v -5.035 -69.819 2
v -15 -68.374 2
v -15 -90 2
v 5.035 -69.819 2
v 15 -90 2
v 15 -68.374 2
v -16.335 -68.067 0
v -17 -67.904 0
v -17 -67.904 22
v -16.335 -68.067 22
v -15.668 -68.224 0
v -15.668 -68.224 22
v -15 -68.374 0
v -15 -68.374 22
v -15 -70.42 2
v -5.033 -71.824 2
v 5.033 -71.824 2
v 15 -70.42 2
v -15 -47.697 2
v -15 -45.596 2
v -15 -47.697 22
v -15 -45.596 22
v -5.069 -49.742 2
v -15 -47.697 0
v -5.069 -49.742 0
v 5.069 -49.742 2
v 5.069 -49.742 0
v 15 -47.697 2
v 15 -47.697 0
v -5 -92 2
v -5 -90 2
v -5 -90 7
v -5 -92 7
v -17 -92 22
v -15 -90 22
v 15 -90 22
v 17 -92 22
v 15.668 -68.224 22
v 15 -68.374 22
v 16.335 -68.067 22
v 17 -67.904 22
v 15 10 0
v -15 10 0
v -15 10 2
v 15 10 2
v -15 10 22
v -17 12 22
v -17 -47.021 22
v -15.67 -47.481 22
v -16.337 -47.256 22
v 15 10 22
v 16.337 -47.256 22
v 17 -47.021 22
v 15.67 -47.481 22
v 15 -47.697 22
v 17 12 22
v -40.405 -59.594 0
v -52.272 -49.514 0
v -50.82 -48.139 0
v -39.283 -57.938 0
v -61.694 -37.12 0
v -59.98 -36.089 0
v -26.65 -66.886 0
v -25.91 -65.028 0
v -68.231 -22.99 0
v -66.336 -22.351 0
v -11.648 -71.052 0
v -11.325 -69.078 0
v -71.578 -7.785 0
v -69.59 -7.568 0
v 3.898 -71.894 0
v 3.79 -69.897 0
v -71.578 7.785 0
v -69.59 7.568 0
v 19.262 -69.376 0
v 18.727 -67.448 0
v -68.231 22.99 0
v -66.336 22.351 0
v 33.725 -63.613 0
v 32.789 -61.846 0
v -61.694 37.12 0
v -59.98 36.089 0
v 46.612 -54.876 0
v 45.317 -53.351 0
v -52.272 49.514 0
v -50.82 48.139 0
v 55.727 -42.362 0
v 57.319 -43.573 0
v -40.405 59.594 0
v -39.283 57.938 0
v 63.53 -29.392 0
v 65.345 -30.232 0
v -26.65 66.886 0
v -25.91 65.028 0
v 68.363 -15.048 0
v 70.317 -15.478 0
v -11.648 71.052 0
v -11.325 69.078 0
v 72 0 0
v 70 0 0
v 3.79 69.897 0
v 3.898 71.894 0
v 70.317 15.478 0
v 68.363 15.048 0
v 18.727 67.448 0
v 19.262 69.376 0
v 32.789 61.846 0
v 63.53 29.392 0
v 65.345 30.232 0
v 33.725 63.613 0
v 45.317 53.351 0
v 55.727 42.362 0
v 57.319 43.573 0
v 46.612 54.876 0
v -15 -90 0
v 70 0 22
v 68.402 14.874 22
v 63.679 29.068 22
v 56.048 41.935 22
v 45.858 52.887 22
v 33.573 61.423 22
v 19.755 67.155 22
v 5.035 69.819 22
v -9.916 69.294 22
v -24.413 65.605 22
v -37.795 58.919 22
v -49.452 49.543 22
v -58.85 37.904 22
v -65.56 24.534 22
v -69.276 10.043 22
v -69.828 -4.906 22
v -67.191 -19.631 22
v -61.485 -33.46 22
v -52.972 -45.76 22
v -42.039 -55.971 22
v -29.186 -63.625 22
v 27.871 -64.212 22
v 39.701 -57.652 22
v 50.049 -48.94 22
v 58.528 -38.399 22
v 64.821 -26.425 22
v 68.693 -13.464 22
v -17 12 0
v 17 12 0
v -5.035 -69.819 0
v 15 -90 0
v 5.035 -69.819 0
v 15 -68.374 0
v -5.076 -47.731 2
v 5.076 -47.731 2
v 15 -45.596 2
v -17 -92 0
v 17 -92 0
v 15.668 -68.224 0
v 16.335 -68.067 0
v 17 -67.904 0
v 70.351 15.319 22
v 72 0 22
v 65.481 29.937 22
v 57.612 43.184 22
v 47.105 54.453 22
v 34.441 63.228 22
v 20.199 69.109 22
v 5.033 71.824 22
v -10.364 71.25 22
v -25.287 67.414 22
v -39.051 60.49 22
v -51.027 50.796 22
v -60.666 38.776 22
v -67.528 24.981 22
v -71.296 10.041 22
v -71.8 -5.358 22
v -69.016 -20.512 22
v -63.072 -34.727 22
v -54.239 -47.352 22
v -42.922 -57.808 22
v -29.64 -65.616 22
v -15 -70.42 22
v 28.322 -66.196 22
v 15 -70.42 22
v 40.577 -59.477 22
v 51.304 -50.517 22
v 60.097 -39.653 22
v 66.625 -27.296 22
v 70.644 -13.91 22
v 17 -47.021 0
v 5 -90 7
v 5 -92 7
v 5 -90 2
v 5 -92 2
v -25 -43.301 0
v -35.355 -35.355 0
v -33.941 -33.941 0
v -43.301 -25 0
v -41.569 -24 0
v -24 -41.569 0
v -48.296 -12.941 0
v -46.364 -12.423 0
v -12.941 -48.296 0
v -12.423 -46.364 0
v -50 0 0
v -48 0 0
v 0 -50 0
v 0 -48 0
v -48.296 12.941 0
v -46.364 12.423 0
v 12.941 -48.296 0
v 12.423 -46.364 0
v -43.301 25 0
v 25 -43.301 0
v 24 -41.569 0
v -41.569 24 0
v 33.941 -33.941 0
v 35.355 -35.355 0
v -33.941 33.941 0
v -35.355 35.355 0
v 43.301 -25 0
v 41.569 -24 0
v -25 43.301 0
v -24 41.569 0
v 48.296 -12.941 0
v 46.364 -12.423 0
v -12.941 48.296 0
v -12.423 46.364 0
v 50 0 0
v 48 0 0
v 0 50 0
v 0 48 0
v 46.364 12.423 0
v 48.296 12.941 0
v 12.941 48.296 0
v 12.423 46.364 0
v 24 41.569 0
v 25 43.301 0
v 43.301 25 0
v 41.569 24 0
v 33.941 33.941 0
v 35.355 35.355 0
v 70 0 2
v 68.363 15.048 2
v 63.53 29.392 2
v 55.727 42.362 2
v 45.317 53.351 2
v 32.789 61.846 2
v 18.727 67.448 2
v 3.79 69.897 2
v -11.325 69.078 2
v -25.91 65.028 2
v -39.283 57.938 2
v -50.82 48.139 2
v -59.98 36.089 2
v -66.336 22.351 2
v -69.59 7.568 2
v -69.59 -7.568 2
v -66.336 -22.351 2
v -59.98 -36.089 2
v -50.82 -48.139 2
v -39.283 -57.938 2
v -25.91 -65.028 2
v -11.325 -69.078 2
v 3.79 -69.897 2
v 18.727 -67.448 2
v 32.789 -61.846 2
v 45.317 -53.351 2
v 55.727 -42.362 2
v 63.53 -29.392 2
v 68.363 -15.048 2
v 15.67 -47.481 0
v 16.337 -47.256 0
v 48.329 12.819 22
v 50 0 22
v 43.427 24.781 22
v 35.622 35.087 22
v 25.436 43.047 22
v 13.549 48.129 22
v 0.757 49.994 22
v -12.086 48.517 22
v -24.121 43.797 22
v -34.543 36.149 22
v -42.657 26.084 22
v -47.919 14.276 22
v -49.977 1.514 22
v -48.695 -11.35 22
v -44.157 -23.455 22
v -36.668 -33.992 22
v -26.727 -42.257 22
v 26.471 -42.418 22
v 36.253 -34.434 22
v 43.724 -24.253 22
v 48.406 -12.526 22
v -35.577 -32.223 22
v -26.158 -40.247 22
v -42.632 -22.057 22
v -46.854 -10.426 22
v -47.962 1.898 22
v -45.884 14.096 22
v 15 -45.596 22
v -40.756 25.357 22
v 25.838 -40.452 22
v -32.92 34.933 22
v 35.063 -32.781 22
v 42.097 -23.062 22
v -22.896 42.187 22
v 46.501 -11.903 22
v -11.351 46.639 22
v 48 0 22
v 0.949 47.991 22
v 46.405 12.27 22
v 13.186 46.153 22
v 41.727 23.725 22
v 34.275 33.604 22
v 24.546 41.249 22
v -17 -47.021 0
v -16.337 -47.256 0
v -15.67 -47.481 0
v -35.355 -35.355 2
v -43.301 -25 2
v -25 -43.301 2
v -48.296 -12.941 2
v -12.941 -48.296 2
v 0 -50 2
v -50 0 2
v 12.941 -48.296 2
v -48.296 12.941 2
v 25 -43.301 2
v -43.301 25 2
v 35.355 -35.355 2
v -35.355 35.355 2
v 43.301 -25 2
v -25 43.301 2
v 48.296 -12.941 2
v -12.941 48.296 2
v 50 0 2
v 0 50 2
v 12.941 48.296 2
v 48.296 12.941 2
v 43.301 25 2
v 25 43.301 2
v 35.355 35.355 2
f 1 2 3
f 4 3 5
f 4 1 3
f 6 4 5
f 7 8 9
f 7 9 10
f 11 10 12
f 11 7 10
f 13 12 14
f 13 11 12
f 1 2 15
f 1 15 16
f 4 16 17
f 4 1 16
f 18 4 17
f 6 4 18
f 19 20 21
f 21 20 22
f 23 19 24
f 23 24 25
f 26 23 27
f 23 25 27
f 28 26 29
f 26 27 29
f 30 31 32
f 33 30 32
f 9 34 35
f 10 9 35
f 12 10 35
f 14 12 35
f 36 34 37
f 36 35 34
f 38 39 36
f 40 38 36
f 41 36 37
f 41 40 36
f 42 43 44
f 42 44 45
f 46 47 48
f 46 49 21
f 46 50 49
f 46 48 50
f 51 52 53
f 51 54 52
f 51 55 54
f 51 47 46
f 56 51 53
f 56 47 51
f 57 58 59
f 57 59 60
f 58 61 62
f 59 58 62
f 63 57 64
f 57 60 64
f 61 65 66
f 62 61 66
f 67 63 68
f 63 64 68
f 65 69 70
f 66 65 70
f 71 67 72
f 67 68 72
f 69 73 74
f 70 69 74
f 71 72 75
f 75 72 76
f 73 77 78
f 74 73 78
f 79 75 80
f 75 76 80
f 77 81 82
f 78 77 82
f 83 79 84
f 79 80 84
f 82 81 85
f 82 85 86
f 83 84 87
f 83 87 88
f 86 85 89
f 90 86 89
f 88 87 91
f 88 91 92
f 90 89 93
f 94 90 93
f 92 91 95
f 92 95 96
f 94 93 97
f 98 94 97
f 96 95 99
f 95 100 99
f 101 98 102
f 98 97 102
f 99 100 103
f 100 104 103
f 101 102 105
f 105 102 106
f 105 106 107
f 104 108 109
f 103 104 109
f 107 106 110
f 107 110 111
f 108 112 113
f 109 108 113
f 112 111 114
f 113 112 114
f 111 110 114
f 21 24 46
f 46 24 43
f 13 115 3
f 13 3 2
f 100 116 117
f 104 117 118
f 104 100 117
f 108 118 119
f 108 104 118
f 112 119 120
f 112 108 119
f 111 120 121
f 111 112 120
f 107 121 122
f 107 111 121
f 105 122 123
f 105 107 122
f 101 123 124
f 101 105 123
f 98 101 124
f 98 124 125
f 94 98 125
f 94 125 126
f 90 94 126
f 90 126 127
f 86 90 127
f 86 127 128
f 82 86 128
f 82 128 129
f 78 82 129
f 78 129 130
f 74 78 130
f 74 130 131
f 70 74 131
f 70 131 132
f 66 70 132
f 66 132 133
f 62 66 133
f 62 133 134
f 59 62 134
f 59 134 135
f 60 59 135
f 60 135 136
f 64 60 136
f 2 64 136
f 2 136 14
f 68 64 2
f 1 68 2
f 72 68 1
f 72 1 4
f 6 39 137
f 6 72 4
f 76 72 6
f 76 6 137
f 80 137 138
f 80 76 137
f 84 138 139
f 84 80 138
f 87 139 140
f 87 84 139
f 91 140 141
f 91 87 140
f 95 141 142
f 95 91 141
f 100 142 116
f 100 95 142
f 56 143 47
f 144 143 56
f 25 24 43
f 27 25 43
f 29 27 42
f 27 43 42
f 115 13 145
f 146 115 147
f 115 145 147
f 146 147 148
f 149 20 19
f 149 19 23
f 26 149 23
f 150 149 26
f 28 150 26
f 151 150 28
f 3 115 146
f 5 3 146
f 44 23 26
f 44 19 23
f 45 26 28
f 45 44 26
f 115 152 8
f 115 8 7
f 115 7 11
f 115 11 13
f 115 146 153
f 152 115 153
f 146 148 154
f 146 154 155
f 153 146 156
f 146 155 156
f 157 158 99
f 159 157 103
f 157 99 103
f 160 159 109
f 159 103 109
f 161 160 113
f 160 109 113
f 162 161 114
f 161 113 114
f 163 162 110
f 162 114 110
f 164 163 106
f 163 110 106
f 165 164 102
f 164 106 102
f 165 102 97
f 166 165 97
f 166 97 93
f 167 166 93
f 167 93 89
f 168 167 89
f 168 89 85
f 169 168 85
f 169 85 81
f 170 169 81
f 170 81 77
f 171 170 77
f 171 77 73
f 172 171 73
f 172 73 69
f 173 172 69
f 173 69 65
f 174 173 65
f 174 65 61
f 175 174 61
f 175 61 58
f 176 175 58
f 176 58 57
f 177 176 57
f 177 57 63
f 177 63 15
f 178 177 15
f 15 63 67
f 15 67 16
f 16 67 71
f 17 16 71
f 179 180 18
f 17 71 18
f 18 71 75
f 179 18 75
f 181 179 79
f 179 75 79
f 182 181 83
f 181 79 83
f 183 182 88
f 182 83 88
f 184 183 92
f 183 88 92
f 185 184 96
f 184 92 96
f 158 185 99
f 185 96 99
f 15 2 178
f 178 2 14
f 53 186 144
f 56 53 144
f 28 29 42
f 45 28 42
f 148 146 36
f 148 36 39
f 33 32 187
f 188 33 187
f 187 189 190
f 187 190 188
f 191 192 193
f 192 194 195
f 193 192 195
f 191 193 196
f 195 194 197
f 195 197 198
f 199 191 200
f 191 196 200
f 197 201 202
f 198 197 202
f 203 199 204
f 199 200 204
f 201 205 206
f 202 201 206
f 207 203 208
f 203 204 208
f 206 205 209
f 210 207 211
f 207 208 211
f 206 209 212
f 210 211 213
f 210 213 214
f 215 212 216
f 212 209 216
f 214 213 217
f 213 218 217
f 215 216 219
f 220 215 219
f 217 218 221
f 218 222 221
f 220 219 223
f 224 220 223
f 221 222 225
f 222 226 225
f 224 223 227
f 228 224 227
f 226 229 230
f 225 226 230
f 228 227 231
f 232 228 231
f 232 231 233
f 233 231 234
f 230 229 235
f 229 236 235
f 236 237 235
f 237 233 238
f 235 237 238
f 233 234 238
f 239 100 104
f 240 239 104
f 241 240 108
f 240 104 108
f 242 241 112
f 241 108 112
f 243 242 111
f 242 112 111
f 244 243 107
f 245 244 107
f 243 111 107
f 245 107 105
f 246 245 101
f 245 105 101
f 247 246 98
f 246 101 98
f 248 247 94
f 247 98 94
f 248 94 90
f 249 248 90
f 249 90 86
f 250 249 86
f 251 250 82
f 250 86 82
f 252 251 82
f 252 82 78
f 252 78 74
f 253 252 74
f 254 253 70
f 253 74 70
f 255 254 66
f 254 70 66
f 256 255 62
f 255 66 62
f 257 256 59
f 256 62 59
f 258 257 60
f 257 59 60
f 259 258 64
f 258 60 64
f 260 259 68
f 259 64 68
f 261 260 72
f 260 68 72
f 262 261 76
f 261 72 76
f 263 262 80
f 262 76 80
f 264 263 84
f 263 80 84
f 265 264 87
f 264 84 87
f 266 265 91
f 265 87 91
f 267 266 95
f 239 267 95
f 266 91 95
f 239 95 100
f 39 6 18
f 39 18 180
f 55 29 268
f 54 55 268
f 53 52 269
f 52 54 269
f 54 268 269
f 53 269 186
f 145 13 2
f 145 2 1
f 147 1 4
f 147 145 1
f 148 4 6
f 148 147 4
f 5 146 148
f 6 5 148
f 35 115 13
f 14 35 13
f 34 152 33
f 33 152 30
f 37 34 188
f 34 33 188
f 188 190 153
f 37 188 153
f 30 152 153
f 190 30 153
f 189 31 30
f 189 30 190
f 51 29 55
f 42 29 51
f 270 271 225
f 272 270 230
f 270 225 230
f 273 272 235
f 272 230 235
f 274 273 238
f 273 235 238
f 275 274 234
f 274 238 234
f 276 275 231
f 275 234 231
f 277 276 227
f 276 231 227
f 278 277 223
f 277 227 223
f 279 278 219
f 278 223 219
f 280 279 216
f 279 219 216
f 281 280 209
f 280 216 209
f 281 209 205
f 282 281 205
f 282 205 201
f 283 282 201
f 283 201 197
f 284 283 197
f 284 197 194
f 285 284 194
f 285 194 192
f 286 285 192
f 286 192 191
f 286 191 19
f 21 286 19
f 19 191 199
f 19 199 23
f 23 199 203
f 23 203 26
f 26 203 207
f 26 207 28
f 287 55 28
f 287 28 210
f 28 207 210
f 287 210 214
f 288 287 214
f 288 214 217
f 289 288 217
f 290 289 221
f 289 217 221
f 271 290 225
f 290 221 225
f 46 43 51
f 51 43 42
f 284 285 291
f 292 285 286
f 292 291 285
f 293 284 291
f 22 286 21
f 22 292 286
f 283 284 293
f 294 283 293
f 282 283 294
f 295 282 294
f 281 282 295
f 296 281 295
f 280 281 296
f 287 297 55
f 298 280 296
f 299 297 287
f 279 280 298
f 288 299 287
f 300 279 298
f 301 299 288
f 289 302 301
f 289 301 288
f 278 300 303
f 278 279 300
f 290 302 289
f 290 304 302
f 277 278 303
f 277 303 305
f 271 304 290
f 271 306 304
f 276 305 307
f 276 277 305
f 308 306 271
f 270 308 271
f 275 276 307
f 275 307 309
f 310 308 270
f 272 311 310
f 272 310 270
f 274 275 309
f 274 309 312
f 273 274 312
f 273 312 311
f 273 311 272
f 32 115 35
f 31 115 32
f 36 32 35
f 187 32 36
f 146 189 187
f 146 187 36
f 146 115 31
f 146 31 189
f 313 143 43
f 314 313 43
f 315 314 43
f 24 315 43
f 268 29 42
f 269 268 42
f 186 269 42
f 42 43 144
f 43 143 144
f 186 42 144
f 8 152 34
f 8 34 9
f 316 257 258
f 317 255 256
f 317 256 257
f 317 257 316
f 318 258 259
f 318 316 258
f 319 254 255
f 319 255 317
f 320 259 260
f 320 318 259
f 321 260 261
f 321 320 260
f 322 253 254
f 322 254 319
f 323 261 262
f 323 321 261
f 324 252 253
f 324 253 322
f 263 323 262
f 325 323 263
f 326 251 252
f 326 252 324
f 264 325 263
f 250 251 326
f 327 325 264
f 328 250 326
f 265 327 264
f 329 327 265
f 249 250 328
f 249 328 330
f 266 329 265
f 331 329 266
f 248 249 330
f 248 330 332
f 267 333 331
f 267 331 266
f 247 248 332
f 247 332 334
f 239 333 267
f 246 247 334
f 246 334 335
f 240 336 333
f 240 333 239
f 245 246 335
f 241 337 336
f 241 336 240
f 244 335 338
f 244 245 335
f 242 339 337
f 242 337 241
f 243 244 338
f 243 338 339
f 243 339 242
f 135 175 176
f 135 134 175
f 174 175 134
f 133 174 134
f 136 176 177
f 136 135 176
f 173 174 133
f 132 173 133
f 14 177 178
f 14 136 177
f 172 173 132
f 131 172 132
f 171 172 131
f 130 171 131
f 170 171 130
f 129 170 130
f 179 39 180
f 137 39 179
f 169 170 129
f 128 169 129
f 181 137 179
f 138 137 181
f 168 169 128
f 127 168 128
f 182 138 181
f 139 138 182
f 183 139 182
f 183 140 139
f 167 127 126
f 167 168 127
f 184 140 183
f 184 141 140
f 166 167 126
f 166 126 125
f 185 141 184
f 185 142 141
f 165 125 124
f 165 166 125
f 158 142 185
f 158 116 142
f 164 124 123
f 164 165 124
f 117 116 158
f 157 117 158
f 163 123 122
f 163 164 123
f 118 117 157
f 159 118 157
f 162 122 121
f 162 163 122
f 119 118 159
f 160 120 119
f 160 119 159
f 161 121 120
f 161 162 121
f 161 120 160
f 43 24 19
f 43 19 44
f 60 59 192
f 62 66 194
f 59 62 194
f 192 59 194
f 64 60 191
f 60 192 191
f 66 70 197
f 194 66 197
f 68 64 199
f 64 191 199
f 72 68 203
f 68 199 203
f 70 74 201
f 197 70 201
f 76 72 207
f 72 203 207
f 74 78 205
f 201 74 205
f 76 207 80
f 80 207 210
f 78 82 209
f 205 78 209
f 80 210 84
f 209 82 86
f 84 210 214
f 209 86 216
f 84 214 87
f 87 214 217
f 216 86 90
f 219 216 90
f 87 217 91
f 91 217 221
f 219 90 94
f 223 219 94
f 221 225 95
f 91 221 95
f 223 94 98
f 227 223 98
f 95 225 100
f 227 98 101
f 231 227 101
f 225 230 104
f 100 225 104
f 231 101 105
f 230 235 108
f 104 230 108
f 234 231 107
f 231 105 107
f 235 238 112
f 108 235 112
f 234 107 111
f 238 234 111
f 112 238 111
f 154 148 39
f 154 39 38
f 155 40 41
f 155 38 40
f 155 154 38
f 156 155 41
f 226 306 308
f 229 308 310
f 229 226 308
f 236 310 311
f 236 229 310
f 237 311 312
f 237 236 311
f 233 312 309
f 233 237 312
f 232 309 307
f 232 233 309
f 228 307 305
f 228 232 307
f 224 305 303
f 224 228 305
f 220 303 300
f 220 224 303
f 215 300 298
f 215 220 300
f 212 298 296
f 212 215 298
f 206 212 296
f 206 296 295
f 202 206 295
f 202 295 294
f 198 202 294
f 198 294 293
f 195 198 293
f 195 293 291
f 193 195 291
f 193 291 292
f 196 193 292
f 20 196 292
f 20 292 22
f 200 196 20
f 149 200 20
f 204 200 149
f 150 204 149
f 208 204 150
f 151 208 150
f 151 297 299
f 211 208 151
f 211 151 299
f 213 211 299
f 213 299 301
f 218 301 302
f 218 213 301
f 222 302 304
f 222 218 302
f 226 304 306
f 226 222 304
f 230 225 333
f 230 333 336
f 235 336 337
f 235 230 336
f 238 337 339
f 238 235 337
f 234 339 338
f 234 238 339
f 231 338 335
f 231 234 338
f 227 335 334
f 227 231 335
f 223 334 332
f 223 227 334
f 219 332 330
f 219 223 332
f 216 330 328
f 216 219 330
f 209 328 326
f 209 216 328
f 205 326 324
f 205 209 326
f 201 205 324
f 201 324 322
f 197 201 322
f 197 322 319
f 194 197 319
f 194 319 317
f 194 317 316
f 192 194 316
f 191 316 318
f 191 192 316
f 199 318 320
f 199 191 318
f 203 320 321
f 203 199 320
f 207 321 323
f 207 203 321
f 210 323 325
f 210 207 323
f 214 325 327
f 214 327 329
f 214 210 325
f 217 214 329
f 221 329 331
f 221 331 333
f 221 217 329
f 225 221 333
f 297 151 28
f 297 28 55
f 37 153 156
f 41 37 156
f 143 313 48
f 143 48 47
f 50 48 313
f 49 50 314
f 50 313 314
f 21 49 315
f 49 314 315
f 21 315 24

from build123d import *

# Parameters (mm, degrees)
F0_R        = 72
F0_R_2      = 70
F1_DEPTH    = 22
F0_R_3      = 50
F0_R_4      = 48
F2_R        = 70
F2_R_2      = 50
F3_DEPTH    = 2
F4_W        = 34
F4_H        = 104
F4_W_2      = 30
F4_H_2      = 100
F5_DEPTH    = 22
F6_W        = 30
F6_H        = 100
F7_DEPTH    = 2
F8_W        = 30
F8_H        = 20
F9_DEPTH    = 75
F10_W       = 10
F10_H       = 5
F11_DEPTH   = 100
F12_R       = 70
F12_R_2     = 50
F3_FACE_R   = 70
F3_FACE_R_2 = 50
F13_DEPTH   = 25
F14_R       = 70
F14_R_2     = 50
F15_DEPTH   = 2


with BuildPart() as f1:
    # F0 (on Top) → F1 (new body)
    with BuildSketch(Plane.XY):
        Circle(F0_R)
        Circle(F0_R_2, mode=Mode.SUBTRACT)
    extrude(amount=F1_DEPTH)


with BuildPart() as f1b:
    # F0 (on Top) → F1, piece 2 (new body)
    with BuildSketch(Plane.XY):
        Circle(F0_R_3)
        Circle(F0_R_4, mode=Mode.SUBTRACT)
    extrude(amount=F1_DEPTH)


with BuildPart() as f3:
    # F2 (on Top) → F3 (new body)
    with BuildSketch(Plane.XY):
        Circle(F2_R)
        Circle(F2_R_2, mode=Mode.SUBTRACT)
    extrude(amount=F3_DEPTH)


with BuildPart() as f5:
    # F4 (on Top) → F5 (new body)
    with BuildSketch(Plane.XY):
        with Locations((0, -40)):
            Rectangle(F4_W, F4_H)
        with Locations((0, -40)):
            Rectangle(F4_W_2, F4_H_2, mode=Mode.SUBTRACT)
    extrude(amount=F5_DEPTH)

    # F10 (on Front) → F11 (cut)
    with BuildSketch(Plane.XZ):
        with Locations((0, 4.5)):
            Rectangle(F10_W, F10_H)
    extrude(amount=F11_DEPTH, mode=Mode.SUBTRACT)


with BuildPart() as f7:
    # F6 (on Top) → F7 (new body)
    with BuildSketch(Plane.XY):
        with Locations((0, -40)):
            Rectangle(F6_W, F6_H)
    extrude(amount=F7_DEPTH)


with BuildPart() as f9_tool:
    # F8 (on Front) → F9 (new body)
    with BuildSketch(Plane.XZ):
        with Locations((0, 12)):
            Rectangle(F8_W, F8_H)
    extrude(amount=F9_DEPTH)


with BuildPart() as f1_1:
    add(f1.part)

    # F9: cut by f9_tool
    add(f9_tool.part, mode=Mode.SUBTRACT)


with BuildPart() as f1b_1:
    add(f1b.part)

    # F9: cut by f9_tool
    add(f9_tool.part, mode=Mode.SUBTRACT)


with BuildPart() as f13_tool:
    # F12 (on Top) + F3_face (on face) → F13 (new body)
    with BuildSketch(Plane.XY):
        Circle(F12_R)
        Circle(F12_R_2, mode=Mode.SUBTRACT)
    with BuildSketch(Plane.XY.offset(2)):
        Circle(F3_FACE_R)
        Circle(F3_FACE_R_2, mode=Mode.SUBTRACT)
    extrude(amount=F13_DEPTH)


with BuildPart() as f3_1:
    add(f3.part)

    # F13: cut by f13_tool
    add(f13_tool.part, mode=Mode.SUBTRACT)


with BuildPart() as f5_1:
    add(f5.part)

    # F13: cut by f13_tool
    add(f13_tool.part, mode=Mode.SUBTRACT)


with BuildPart() as f7_1:
    add(f7.part)

    # F13: cut by f13_tool
    add(f13_tool.part, mode=Mode.SUBTRACT)


with BuildPart() as f15:
    # F14 (on Top) → F15 (new body)
    with BuildSketch(Plane.XY):
        Circle(F14_R)
        Circle(F14_R_2, mode=Mode.SUBTRACT)
    extrude(amount=F15_DEPTH)


solid = Compound([f1_1.part, f1b_1.part, f5_1.part, f7_1.part, f15.part])
